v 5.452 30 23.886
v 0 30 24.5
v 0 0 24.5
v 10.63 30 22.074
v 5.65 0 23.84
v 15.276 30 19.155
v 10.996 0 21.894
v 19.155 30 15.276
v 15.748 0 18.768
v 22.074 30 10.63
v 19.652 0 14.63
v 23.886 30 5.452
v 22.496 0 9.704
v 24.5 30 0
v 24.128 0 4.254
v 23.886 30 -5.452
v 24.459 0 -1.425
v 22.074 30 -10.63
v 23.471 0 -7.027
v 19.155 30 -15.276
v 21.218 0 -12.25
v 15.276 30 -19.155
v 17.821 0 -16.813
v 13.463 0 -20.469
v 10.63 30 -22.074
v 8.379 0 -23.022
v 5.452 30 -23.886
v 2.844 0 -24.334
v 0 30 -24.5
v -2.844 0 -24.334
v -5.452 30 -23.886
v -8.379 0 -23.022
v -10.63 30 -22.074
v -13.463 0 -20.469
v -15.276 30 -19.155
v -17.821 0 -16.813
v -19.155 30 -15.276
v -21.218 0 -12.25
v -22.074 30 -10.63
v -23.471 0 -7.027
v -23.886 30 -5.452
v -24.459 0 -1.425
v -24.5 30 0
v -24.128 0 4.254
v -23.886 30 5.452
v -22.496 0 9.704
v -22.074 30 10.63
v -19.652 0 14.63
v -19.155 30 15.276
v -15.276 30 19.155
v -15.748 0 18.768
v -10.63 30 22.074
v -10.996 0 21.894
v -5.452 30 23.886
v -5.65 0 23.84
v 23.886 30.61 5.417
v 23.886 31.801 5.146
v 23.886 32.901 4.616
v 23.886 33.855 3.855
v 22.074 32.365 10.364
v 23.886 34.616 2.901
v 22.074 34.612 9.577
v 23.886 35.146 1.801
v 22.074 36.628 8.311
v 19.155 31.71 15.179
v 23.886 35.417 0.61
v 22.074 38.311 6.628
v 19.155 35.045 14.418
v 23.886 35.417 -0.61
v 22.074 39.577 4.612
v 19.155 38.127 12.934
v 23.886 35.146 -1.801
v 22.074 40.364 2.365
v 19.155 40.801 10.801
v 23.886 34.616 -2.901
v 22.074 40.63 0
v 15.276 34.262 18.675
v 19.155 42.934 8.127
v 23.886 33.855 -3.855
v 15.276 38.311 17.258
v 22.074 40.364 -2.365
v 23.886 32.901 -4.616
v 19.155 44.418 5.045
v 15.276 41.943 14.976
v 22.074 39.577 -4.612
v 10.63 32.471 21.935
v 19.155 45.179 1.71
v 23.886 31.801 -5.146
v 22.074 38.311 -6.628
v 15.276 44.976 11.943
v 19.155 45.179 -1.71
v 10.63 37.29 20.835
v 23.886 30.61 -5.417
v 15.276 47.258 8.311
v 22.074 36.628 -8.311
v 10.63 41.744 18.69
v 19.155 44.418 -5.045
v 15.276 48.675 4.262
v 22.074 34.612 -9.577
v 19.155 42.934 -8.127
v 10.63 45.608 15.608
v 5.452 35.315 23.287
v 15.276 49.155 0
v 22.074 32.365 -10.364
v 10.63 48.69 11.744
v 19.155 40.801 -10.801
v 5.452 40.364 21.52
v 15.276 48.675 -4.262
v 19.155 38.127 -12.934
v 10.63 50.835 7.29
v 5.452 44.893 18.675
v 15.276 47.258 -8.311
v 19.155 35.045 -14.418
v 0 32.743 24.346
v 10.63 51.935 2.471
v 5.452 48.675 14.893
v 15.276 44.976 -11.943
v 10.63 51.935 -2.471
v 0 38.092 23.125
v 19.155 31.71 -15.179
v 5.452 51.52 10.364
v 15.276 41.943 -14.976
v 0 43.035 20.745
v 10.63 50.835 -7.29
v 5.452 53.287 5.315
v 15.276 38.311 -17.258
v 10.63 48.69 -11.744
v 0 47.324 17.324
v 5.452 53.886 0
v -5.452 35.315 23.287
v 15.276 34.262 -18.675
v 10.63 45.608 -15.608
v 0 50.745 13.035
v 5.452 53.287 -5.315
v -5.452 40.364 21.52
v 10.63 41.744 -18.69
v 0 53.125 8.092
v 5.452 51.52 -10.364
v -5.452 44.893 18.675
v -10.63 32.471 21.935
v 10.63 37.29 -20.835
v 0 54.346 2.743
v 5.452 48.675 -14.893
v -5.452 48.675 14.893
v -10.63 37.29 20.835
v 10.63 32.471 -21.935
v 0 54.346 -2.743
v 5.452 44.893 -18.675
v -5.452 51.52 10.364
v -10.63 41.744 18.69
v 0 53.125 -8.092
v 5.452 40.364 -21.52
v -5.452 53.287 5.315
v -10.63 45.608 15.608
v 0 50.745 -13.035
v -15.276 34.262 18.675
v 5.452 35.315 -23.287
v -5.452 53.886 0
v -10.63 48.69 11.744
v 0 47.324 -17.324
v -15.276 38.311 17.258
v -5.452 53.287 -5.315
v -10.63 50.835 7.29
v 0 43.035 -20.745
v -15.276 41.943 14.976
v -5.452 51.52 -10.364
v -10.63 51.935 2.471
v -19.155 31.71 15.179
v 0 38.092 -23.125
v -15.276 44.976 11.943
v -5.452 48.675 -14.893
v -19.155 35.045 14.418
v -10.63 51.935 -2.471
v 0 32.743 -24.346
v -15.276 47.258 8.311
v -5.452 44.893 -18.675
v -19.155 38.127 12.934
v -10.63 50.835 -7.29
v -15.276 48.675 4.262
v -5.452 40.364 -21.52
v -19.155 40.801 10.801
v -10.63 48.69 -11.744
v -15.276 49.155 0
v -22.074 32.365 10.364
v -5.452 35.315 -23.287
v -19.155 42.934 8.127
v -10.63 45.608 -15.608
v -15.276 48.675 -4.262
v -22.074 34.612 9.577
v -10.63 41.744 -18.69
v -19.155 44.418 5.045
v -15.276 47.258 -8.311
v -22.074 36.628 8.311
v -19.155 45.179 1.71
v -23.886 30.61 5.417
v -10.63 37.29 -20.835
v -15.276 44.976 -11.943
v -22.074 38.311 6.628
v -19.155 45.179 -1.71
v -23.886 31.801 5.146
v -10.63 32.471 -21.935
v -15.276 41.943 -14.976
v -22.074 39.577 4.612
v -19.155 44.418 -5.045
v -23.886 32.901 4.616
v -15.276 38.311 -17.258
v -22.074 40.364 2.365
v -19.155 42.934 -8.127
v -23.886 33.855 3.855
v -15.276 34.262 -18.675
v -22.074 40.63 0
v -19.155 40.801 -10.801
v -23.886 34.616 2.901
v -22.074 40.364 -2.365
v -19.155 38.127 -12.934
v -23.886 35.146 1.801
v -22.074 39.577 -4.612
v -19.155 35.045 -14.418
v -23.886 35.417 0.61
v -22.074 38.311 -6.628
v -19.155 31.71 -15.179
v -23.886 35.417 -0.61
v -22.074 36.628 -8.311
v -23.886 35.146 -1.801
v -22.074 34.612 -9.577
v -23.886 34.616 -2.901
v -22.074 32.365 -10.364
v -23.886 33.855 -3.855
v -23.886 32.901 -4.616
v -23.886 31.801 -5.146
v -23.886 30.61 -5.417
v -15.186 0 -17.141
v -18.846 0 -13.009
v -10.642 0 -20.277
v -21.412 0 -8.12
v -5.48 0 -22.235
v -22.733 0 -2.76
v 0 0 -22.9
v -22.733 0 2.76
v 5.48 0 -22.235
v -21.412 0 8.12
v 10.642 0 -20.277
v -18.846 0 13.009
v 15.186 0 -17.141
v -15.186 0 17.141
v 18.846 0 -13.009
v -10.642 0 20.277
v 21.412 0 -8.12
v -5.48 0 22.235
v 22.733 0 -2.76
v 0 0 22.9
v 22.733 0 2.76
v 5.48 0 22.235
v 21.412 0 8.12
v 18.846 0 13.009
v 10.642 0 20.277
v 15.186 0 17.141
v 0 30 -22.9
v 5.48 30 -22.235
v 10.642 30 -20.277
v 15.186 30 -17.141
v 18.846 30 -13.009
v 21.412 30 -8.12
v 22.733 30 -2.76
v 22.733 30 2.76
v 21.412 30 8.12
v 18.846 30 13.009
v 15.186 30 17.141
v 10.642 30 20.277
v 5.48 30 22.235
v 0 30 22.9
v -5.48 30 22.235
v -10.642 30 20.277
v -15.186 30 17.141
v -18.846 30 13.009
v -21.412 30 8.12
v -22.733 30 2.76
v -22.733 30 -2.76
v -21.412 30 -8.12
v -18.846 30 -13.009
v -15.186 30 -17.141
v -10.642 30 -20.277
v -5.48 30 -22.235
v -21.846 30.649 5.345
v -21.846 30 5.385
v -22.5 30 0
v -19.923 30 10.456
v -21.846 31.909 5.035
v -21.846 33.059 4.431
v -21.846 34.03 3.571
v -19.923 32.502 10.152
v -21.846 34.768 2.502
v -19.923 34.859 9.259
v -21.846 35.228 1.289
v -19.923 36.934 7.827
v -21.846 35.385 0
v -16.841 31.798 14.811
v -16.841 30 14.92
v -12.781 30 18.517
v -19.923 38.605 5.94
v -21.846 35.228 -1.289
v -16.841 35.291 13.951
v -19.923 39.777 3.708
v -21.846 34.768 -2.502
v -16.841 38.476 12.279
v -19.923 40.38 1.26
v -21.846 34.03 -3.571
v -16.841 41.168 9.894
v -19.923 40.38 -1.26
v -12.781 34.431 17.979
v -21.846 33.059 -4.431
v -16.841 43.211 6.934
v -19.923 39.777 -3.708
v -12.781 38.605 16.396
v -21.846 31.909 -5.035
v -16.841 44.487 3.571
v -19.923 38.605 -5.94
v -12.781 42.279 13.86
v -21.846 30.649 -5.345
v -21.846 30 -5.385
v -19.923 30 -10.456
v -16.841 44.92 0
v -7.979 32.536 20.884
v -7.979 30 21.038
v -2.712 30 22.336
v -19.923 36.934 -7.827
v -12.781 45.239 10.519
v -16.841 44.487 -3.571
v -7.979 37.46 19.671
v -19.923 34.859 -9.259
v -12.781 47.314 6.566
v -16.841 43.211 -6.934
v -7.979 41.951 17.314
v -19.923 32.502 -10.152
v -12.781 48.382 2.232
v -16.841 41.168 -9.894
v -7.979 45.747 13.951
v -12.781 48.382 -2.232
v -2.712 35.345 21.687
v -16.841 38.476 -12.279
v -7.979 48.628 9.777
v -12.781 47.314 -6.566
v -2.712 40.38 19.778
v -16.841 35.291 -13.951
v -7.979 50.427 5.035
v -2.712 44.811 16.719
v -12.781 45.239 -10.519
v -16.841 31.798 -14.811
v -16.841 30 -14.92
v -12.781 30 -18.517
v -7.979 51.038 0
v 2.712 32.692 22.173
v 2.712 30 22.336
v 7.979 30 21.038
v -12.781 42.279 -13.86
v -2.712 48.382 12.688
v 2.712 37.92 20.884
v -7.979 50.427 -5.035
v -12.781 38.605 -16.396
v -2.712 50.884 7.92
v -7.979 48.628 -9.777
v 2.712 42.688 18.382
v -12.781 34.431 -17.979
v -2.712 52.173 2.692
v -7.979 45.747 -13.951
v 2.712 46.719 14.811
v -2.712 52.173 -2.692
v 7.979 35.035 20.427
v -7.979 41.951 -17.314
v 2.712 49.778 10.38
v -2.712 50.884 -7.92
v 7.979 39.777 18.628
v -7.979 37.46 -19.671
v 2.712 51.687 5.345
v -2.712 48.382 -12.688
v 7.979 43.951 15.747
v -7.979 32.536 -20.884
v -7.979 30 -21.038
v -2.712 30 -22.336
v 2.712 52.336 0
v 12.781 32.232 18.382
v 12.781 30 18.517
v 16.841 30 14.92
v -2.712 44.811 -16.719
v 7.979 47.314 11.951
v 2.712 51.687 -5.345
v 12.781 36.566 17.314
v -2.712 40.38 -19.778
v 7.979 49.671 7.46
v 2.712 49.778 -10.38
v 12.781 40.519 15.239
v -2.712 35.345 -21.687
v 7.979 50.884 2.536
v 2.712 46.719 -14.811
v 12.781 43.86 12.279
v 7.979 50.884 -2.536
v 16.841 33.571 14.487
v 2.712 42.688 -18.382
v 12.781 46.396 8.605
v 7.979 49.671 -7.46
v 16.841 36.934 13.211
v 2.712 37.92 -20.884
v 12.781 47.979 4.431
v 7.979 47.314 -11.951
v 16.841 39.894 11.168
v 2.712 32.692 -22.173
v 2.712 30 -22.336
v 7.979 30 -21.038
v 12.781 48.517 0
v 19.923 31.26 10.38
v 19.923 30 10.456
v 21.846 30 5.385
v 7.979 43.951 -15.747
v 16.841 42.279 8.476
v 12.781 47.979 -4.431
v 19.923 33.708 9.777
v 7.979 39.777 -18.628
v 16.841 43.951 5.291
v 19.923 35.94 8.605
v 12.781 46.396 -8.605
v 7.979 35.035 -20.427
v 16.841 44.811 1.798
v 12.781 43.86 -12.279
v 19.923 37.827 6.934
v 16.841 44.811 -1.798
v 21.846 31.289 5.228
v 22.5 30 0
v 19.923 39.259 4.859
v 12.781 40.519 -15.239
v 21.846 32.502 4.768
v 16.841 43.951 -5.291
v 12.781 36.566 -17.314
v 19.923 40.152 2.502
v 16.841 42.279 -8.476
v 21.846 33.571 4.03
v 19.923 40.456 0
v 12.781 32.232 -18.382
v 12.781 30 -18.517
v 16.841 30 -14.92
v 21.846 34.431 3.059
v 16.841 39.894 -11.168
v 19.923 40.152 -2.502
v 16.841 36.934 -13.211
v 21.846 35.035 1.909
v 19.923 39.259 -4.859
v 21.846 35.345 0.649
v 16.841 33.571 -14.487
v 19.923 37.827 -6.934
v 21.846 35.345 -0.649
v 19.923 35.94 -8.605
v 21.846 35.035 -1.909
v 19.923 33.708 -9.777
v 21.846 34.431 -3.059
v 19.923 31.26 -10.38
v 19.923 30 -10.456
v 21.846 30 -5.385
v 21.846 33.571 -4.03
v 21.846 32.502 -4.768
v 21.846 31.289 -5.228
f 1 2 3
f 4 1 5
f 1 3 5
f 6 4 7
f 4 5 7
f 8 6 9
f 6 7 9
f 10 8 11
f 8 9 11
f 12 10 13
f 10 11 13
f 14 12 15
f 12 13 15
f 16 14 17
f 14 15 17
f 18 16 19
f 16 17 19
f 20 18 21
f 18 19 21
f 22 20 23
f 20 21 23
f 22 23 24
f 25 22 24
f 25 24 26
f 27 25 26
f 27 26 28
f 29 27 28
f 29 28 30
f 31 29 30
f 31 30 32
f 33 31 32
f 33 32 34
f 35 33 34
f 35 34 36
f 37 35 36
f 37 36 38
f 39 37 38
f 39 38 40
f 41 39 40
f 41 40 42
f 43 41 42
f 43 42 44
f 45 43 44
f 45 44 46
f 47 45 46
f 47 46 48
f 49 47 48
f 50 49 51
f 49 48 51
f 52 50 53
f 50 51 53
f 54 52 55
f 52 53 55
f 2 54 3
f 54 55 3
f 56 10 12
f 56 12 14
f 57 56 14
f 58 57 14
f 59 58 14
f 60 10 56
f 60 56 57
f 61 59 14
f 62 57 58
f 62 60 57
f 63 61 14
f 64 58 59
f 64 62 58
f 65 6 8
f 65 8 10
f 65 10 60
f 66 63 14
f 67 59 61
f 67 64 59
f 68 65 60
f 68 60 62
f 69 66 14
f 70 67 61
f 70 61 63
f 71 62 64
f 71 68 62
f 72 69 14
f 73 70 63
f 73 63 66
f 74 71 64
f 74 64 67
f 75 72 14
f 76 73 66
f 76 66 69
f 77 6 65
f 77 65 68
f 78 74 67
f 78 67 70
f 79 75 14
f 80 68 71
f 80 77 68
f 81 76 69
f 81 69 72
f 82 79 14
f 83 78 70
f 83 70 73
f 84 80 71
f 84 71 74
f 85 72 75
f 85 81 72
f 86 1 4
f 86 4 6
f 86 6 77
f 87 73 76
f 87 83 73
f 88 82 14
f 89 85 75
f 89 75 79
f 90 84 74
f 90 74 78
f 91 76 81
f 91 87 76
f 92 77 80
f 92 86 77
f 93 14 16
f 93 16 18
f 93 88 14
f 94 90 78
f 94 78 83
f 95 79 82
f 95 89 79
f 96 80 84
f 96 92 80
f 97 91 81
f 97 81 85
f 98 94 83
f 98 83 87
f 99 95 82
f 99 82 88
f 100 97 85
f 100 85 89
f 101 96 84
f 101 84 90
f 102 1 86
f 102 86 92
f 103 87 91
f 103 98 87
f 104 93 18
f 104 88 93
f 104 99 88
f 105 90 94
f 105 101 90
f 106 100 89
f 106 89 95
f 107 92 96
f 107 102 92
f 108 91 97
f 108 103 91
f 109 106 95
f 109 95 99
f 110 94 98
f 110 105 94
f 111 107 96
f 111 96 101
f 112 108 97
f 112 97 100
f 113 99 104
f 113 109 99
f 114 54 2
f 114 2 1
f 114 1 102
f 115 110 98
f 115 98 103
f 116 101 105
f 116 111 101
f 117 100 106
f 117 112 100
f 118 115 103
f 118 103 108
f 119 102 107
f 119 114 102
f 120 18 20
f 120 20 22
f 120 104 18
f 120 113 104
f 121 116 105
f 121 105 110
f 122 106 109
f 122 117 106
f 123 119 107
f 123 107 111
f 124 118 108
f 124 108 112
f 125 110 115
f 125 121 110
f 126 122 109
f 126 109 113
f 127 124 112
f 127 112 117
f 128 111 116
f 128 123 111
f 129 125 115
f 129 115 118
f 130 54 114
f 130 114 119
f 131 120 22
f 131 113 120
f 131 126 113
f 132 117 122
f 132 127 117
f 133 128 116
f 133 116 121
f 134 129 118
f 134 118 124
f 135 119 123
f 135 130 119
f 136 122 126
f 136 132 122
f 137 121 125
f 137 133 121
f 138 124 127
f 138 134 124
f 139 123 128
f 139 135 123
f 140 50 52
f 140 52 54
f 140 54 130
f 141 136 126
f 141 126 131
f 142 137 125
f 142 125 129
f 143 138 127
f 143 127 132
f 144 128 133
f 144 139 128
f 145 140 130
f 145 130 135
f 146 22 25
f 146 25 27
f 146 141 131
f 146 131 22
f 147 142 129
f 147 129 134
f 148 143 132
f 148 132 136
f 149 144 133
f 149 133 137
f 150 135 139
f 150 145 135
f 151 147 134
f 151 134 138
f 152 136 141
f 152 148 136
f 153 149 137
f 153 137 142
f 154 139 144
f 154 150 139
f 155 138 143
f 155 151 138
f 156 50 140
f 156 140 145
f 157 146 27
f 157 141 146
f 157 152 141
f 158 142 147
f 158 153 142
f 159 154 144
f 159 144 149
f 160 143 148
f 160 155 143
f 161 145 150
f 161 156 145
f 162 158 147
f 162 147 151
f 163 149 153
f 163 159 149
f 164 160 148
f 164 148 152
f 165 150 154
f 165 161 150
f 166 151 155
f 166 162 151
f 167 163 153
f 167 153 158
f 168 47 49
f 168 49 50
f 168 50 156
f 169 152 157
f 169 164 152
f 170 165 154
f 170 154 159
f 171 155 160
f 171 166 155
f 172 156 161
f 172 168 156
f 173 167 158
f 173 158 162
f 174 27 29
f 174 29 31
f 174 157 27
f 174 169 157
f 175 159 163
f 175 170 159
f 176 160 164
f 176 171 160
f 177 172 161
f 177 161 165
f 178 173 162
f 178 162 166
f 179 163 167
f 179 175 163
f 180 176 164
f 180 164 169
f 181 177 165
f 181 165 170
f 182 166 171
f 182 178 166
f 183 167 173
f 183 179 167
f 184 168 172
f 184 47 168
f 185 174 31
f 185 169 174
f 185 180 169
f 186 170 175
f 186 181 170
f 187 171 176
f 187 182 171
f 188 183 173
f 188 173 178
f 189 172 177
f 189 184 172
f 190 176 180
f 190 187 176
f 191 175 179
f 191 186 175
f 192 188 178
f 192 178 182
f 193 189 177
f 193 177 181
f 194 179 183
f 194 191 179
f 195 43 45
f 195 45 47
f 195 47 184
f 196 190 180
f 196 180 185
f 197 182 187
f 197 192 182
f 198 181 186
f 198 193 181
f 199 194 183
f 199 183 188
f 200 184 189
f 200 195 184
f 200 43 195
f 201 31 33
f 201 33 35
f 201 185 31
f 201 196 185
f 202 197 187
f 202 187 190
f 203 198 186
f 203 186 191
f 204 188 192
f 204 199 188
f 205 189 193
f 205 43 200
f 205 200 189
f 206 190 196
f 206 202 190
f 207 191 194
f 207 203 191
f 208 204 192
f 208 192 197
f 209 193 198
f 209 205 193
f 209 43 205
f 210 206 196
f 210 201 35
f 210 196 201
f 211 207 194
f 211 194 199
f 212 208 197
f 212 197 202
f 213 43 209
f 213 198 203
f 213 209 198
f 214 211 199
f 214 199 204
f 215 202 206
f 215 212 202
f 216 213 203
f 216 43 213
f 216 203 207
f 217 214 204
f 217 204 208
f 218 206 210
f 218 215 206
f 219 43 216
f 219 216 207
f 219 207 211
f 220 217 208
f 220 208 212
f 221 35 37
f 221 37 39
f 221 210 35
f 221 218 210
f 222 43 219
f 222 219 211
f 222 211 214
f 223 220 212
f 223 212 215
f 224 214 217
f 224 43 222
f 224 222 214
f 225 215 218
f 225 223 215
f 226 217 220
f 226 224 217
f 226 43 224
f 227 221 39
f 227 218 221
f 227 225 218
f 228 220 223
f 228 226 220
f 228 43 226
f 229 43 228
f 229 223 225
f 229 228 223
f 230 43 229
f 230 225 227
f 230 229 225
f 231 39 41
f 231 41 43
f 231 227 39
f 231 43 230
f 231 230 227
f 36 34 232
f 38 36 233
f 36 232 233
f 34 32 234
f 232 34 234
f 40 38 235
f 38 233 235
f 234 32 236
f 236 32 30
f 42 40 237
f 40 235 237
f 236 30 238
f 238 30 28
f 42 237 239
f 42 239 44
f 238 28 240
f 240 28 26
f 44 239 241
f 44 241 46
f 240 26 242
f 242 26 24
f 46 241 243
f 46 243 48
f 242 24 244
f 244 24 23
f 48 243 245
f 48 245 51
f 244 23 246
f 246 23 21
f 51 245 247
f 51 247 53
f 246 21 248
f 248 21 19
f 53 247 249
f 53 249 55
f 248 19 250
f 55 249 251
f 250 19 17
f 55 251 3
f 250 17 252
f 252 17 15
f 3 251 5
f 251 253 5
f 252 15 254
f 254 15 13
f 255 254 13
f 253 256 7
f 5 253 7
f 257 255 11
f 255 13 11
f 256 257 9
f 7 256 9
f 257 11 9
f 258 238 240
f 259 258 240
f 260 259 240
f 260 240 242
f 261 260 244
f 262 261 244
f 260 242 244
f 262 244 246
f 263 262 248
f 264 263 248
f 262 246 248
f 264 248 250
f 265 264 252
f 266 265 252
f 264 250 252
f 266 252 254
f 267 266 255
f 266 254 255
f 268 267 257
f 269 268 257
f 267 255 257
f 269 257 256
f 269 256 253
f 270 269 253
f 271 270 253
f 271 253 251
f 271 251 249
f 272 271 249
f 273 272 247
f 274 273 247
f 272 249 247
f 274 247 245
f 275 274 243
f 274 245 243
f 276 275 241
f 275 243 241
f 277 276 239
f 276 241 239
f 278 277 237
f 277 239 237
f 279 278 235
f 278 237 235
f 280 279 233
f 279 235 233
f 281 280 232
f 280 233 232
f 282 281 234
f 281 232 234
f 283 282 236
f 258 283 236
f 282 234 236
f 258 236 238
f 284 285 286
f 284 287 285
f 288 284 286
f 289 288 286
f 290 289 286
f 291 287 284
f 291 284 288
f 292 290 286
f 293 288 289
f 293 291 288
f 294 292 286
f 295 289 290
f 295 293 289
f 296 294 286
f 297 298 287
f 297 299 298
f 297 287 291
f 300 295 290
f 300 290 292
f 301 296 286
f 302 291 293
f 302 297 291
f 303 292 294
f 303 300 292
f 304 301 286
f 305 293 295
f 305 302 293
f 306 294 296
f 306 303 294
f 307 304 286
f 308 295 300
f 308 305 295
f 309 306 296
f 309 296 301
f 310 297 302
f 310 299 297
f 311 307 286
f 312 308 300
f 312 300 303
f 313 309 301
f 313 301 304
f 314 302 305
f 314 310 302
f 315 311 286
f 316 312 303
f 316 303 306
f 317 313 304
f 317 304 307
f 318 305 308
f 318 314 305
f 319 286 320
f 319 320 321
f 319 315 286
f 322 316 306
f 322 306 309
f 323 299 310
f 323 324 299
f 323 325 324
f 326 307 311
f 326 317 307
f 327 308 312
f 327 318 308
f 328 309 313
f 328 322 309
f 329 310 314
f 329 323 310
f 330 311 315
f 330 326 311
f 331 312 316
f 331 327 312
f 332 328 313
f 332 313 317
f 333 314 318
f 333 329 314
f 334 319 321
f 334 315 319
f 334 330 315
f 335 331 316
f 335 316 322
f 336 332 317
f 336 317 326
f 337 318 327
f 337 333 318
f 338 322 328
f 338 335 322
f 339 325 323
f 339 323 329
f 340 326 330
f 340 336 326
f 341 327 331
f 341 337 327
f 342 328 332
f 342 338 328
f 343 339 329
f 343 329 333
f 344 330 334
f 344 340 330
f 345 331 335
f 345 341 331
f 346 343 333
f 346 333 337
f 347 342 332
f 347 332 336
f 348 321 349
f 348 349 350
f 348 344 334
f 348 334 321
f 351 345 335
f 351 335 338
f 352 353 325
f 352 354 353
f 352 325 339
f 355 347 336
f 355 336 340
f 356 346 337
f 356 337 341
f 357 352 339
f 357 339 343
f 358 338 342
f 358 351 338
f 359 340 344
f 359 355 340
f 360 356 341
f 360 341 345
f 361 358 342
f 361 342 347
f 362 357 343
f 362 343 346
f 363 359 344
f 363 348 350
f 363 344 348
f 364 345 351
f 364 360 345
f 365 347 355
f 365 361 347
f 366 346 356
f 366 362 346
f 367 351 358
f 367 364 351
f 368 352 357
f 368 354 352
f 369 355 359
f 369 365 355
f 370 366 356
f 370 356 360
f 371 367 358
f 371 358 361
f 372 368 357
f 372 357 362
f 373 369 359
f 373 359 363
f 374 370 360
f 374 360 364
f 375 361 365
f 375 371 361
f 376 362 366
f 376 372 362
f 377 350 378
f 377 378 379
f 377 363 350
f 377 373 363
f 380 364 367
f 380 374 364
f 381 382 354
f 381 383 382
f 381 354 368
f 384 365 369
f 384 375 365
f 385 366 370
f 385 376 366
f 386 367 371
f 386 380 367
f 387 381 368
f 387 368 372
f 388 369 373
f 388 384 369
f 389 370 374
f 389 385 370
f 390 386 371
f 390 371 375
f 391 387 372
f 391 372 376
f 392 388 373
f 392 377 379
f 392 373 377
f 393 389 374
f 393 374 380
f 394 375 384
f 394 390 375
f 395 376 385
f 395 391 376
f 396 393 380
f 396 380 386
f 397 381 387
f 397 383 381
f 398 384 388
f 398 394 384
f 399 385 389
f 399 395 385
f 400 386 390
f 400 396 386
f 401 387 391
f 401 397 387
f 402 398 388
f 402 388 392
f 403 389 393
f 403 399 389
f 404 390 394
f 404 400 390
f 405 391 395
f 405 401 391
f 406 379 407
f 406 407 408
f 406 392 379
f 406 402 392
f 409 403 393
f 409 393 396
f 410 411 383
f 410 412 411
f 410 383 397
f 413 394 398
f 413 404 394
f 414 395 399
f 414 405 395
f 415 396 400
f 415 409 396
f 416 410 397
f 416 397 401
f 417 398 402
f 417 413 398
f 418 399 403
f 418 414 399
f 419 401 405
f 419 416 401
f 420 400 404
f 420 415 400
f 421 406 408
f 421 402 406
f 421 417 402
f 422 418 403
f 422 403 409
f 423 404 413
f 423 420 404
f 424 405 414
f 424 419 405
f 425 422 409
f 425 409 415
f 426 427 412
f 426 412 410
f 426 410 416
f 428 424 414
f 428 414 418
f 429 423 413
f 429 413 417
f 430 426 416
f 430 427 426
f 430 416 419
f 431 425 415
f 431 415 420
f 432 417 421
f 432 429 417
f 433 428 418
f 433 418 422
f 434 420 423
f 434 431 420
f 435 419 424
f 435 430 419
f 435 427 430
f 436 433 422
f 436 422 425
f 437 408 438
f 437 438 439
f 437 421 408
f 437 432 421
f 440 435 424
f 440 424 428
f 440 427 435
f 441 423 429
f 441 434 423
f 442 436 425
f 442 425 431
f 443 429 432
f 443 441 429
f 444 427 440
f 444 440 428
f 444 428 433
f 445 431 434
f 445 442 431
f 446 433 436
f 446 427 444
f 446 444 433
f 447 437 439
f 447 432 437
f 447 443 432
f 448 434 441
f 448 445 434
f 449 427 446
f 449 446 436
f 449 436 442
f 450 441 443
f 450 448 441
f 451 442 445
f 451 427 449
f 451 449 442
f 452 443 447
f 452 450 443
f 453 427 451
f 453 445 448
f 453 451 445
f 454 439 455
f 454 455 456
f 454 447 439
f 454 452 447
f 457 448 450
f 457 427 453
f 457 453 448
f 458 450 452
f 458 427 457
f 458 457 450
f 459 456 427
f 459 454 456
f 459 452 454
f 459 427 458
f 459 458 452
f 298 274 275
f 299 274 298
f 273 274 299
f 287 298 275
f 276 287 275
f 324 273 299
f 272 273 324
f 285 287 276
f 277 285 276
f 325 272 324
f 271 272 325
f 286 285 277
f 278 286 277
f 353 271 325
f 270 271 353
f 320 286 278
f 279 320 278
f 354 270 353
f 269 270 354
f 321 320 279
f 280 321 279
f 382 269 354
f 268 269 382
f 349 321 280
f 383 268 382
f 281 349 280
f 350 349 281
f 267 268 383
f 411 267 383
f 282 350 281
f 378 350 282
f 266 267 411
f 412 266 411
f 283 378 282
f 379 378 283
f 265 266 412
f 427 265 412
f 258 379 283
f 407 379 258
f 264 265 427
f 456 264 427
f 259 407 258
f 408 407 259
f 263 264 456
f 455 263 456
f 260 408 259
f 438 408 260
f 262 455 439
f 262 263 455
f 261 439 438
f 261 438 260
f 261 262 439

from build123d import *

# Parameters (mm, degrees)
SKETCH2_R           = 24.5
BOSS_EXTRUDE1_DEPTH = 30
REVOLVE_THIN1_ANGLE = 180
SKETCH6_R           = 22.9
CUT_EXTRUDE1_DEPTH  = 30


with BuildPart() as part:
    # Sketch2 → Boss-Extrude1 (new body)
    with BuildSketch(Plane(origin=(0, 0, 0), x_dir=(1, 0, 0), z_dir=(0, 1, 0))):
        with Locations(Location((0, 0, 0), (0, 0, 270))):
            Circle(SKETCH2_R)
    extrude(amount=BOSS_EXTRUDE1_DEPTH)

    # Sketch4 → Revolve-Thin1 (revolve)
    with BuildSketch(Plane(origin=(0, 30, 0), x_dir=(1, 0, 0), z_dir=(0, 1, 0))):
        with BuildLine():
            ThreePointArc((24.5, 0), (0, -24.5), (-24.5, 0))
            Line((-24.5, 0), (-22.5, 0))
            ThreePointArc((-22.5, 0), (0, -22.5), (22.5, 0))
            Line((22.5, 0), (24.5, 0))
        make_face()
    revolve(axis=Axis((0, 30, 0), (-1, 0, 0)), revolution_arc=REVOLVE_THIN1_ANGLE)

    # Sketch6 → Cut-Extrude1 (cut)
    with BuildSketch(Plane.XZ):
        with Locations(Location((0, 0, 0), (0, 0, 270))):
            Circle(SKETCH6_R)
    extrude(amount=-CUT_EXTRUDE1_DEPTH, mode=Mode.SUBTRACT)


solid = part.part
